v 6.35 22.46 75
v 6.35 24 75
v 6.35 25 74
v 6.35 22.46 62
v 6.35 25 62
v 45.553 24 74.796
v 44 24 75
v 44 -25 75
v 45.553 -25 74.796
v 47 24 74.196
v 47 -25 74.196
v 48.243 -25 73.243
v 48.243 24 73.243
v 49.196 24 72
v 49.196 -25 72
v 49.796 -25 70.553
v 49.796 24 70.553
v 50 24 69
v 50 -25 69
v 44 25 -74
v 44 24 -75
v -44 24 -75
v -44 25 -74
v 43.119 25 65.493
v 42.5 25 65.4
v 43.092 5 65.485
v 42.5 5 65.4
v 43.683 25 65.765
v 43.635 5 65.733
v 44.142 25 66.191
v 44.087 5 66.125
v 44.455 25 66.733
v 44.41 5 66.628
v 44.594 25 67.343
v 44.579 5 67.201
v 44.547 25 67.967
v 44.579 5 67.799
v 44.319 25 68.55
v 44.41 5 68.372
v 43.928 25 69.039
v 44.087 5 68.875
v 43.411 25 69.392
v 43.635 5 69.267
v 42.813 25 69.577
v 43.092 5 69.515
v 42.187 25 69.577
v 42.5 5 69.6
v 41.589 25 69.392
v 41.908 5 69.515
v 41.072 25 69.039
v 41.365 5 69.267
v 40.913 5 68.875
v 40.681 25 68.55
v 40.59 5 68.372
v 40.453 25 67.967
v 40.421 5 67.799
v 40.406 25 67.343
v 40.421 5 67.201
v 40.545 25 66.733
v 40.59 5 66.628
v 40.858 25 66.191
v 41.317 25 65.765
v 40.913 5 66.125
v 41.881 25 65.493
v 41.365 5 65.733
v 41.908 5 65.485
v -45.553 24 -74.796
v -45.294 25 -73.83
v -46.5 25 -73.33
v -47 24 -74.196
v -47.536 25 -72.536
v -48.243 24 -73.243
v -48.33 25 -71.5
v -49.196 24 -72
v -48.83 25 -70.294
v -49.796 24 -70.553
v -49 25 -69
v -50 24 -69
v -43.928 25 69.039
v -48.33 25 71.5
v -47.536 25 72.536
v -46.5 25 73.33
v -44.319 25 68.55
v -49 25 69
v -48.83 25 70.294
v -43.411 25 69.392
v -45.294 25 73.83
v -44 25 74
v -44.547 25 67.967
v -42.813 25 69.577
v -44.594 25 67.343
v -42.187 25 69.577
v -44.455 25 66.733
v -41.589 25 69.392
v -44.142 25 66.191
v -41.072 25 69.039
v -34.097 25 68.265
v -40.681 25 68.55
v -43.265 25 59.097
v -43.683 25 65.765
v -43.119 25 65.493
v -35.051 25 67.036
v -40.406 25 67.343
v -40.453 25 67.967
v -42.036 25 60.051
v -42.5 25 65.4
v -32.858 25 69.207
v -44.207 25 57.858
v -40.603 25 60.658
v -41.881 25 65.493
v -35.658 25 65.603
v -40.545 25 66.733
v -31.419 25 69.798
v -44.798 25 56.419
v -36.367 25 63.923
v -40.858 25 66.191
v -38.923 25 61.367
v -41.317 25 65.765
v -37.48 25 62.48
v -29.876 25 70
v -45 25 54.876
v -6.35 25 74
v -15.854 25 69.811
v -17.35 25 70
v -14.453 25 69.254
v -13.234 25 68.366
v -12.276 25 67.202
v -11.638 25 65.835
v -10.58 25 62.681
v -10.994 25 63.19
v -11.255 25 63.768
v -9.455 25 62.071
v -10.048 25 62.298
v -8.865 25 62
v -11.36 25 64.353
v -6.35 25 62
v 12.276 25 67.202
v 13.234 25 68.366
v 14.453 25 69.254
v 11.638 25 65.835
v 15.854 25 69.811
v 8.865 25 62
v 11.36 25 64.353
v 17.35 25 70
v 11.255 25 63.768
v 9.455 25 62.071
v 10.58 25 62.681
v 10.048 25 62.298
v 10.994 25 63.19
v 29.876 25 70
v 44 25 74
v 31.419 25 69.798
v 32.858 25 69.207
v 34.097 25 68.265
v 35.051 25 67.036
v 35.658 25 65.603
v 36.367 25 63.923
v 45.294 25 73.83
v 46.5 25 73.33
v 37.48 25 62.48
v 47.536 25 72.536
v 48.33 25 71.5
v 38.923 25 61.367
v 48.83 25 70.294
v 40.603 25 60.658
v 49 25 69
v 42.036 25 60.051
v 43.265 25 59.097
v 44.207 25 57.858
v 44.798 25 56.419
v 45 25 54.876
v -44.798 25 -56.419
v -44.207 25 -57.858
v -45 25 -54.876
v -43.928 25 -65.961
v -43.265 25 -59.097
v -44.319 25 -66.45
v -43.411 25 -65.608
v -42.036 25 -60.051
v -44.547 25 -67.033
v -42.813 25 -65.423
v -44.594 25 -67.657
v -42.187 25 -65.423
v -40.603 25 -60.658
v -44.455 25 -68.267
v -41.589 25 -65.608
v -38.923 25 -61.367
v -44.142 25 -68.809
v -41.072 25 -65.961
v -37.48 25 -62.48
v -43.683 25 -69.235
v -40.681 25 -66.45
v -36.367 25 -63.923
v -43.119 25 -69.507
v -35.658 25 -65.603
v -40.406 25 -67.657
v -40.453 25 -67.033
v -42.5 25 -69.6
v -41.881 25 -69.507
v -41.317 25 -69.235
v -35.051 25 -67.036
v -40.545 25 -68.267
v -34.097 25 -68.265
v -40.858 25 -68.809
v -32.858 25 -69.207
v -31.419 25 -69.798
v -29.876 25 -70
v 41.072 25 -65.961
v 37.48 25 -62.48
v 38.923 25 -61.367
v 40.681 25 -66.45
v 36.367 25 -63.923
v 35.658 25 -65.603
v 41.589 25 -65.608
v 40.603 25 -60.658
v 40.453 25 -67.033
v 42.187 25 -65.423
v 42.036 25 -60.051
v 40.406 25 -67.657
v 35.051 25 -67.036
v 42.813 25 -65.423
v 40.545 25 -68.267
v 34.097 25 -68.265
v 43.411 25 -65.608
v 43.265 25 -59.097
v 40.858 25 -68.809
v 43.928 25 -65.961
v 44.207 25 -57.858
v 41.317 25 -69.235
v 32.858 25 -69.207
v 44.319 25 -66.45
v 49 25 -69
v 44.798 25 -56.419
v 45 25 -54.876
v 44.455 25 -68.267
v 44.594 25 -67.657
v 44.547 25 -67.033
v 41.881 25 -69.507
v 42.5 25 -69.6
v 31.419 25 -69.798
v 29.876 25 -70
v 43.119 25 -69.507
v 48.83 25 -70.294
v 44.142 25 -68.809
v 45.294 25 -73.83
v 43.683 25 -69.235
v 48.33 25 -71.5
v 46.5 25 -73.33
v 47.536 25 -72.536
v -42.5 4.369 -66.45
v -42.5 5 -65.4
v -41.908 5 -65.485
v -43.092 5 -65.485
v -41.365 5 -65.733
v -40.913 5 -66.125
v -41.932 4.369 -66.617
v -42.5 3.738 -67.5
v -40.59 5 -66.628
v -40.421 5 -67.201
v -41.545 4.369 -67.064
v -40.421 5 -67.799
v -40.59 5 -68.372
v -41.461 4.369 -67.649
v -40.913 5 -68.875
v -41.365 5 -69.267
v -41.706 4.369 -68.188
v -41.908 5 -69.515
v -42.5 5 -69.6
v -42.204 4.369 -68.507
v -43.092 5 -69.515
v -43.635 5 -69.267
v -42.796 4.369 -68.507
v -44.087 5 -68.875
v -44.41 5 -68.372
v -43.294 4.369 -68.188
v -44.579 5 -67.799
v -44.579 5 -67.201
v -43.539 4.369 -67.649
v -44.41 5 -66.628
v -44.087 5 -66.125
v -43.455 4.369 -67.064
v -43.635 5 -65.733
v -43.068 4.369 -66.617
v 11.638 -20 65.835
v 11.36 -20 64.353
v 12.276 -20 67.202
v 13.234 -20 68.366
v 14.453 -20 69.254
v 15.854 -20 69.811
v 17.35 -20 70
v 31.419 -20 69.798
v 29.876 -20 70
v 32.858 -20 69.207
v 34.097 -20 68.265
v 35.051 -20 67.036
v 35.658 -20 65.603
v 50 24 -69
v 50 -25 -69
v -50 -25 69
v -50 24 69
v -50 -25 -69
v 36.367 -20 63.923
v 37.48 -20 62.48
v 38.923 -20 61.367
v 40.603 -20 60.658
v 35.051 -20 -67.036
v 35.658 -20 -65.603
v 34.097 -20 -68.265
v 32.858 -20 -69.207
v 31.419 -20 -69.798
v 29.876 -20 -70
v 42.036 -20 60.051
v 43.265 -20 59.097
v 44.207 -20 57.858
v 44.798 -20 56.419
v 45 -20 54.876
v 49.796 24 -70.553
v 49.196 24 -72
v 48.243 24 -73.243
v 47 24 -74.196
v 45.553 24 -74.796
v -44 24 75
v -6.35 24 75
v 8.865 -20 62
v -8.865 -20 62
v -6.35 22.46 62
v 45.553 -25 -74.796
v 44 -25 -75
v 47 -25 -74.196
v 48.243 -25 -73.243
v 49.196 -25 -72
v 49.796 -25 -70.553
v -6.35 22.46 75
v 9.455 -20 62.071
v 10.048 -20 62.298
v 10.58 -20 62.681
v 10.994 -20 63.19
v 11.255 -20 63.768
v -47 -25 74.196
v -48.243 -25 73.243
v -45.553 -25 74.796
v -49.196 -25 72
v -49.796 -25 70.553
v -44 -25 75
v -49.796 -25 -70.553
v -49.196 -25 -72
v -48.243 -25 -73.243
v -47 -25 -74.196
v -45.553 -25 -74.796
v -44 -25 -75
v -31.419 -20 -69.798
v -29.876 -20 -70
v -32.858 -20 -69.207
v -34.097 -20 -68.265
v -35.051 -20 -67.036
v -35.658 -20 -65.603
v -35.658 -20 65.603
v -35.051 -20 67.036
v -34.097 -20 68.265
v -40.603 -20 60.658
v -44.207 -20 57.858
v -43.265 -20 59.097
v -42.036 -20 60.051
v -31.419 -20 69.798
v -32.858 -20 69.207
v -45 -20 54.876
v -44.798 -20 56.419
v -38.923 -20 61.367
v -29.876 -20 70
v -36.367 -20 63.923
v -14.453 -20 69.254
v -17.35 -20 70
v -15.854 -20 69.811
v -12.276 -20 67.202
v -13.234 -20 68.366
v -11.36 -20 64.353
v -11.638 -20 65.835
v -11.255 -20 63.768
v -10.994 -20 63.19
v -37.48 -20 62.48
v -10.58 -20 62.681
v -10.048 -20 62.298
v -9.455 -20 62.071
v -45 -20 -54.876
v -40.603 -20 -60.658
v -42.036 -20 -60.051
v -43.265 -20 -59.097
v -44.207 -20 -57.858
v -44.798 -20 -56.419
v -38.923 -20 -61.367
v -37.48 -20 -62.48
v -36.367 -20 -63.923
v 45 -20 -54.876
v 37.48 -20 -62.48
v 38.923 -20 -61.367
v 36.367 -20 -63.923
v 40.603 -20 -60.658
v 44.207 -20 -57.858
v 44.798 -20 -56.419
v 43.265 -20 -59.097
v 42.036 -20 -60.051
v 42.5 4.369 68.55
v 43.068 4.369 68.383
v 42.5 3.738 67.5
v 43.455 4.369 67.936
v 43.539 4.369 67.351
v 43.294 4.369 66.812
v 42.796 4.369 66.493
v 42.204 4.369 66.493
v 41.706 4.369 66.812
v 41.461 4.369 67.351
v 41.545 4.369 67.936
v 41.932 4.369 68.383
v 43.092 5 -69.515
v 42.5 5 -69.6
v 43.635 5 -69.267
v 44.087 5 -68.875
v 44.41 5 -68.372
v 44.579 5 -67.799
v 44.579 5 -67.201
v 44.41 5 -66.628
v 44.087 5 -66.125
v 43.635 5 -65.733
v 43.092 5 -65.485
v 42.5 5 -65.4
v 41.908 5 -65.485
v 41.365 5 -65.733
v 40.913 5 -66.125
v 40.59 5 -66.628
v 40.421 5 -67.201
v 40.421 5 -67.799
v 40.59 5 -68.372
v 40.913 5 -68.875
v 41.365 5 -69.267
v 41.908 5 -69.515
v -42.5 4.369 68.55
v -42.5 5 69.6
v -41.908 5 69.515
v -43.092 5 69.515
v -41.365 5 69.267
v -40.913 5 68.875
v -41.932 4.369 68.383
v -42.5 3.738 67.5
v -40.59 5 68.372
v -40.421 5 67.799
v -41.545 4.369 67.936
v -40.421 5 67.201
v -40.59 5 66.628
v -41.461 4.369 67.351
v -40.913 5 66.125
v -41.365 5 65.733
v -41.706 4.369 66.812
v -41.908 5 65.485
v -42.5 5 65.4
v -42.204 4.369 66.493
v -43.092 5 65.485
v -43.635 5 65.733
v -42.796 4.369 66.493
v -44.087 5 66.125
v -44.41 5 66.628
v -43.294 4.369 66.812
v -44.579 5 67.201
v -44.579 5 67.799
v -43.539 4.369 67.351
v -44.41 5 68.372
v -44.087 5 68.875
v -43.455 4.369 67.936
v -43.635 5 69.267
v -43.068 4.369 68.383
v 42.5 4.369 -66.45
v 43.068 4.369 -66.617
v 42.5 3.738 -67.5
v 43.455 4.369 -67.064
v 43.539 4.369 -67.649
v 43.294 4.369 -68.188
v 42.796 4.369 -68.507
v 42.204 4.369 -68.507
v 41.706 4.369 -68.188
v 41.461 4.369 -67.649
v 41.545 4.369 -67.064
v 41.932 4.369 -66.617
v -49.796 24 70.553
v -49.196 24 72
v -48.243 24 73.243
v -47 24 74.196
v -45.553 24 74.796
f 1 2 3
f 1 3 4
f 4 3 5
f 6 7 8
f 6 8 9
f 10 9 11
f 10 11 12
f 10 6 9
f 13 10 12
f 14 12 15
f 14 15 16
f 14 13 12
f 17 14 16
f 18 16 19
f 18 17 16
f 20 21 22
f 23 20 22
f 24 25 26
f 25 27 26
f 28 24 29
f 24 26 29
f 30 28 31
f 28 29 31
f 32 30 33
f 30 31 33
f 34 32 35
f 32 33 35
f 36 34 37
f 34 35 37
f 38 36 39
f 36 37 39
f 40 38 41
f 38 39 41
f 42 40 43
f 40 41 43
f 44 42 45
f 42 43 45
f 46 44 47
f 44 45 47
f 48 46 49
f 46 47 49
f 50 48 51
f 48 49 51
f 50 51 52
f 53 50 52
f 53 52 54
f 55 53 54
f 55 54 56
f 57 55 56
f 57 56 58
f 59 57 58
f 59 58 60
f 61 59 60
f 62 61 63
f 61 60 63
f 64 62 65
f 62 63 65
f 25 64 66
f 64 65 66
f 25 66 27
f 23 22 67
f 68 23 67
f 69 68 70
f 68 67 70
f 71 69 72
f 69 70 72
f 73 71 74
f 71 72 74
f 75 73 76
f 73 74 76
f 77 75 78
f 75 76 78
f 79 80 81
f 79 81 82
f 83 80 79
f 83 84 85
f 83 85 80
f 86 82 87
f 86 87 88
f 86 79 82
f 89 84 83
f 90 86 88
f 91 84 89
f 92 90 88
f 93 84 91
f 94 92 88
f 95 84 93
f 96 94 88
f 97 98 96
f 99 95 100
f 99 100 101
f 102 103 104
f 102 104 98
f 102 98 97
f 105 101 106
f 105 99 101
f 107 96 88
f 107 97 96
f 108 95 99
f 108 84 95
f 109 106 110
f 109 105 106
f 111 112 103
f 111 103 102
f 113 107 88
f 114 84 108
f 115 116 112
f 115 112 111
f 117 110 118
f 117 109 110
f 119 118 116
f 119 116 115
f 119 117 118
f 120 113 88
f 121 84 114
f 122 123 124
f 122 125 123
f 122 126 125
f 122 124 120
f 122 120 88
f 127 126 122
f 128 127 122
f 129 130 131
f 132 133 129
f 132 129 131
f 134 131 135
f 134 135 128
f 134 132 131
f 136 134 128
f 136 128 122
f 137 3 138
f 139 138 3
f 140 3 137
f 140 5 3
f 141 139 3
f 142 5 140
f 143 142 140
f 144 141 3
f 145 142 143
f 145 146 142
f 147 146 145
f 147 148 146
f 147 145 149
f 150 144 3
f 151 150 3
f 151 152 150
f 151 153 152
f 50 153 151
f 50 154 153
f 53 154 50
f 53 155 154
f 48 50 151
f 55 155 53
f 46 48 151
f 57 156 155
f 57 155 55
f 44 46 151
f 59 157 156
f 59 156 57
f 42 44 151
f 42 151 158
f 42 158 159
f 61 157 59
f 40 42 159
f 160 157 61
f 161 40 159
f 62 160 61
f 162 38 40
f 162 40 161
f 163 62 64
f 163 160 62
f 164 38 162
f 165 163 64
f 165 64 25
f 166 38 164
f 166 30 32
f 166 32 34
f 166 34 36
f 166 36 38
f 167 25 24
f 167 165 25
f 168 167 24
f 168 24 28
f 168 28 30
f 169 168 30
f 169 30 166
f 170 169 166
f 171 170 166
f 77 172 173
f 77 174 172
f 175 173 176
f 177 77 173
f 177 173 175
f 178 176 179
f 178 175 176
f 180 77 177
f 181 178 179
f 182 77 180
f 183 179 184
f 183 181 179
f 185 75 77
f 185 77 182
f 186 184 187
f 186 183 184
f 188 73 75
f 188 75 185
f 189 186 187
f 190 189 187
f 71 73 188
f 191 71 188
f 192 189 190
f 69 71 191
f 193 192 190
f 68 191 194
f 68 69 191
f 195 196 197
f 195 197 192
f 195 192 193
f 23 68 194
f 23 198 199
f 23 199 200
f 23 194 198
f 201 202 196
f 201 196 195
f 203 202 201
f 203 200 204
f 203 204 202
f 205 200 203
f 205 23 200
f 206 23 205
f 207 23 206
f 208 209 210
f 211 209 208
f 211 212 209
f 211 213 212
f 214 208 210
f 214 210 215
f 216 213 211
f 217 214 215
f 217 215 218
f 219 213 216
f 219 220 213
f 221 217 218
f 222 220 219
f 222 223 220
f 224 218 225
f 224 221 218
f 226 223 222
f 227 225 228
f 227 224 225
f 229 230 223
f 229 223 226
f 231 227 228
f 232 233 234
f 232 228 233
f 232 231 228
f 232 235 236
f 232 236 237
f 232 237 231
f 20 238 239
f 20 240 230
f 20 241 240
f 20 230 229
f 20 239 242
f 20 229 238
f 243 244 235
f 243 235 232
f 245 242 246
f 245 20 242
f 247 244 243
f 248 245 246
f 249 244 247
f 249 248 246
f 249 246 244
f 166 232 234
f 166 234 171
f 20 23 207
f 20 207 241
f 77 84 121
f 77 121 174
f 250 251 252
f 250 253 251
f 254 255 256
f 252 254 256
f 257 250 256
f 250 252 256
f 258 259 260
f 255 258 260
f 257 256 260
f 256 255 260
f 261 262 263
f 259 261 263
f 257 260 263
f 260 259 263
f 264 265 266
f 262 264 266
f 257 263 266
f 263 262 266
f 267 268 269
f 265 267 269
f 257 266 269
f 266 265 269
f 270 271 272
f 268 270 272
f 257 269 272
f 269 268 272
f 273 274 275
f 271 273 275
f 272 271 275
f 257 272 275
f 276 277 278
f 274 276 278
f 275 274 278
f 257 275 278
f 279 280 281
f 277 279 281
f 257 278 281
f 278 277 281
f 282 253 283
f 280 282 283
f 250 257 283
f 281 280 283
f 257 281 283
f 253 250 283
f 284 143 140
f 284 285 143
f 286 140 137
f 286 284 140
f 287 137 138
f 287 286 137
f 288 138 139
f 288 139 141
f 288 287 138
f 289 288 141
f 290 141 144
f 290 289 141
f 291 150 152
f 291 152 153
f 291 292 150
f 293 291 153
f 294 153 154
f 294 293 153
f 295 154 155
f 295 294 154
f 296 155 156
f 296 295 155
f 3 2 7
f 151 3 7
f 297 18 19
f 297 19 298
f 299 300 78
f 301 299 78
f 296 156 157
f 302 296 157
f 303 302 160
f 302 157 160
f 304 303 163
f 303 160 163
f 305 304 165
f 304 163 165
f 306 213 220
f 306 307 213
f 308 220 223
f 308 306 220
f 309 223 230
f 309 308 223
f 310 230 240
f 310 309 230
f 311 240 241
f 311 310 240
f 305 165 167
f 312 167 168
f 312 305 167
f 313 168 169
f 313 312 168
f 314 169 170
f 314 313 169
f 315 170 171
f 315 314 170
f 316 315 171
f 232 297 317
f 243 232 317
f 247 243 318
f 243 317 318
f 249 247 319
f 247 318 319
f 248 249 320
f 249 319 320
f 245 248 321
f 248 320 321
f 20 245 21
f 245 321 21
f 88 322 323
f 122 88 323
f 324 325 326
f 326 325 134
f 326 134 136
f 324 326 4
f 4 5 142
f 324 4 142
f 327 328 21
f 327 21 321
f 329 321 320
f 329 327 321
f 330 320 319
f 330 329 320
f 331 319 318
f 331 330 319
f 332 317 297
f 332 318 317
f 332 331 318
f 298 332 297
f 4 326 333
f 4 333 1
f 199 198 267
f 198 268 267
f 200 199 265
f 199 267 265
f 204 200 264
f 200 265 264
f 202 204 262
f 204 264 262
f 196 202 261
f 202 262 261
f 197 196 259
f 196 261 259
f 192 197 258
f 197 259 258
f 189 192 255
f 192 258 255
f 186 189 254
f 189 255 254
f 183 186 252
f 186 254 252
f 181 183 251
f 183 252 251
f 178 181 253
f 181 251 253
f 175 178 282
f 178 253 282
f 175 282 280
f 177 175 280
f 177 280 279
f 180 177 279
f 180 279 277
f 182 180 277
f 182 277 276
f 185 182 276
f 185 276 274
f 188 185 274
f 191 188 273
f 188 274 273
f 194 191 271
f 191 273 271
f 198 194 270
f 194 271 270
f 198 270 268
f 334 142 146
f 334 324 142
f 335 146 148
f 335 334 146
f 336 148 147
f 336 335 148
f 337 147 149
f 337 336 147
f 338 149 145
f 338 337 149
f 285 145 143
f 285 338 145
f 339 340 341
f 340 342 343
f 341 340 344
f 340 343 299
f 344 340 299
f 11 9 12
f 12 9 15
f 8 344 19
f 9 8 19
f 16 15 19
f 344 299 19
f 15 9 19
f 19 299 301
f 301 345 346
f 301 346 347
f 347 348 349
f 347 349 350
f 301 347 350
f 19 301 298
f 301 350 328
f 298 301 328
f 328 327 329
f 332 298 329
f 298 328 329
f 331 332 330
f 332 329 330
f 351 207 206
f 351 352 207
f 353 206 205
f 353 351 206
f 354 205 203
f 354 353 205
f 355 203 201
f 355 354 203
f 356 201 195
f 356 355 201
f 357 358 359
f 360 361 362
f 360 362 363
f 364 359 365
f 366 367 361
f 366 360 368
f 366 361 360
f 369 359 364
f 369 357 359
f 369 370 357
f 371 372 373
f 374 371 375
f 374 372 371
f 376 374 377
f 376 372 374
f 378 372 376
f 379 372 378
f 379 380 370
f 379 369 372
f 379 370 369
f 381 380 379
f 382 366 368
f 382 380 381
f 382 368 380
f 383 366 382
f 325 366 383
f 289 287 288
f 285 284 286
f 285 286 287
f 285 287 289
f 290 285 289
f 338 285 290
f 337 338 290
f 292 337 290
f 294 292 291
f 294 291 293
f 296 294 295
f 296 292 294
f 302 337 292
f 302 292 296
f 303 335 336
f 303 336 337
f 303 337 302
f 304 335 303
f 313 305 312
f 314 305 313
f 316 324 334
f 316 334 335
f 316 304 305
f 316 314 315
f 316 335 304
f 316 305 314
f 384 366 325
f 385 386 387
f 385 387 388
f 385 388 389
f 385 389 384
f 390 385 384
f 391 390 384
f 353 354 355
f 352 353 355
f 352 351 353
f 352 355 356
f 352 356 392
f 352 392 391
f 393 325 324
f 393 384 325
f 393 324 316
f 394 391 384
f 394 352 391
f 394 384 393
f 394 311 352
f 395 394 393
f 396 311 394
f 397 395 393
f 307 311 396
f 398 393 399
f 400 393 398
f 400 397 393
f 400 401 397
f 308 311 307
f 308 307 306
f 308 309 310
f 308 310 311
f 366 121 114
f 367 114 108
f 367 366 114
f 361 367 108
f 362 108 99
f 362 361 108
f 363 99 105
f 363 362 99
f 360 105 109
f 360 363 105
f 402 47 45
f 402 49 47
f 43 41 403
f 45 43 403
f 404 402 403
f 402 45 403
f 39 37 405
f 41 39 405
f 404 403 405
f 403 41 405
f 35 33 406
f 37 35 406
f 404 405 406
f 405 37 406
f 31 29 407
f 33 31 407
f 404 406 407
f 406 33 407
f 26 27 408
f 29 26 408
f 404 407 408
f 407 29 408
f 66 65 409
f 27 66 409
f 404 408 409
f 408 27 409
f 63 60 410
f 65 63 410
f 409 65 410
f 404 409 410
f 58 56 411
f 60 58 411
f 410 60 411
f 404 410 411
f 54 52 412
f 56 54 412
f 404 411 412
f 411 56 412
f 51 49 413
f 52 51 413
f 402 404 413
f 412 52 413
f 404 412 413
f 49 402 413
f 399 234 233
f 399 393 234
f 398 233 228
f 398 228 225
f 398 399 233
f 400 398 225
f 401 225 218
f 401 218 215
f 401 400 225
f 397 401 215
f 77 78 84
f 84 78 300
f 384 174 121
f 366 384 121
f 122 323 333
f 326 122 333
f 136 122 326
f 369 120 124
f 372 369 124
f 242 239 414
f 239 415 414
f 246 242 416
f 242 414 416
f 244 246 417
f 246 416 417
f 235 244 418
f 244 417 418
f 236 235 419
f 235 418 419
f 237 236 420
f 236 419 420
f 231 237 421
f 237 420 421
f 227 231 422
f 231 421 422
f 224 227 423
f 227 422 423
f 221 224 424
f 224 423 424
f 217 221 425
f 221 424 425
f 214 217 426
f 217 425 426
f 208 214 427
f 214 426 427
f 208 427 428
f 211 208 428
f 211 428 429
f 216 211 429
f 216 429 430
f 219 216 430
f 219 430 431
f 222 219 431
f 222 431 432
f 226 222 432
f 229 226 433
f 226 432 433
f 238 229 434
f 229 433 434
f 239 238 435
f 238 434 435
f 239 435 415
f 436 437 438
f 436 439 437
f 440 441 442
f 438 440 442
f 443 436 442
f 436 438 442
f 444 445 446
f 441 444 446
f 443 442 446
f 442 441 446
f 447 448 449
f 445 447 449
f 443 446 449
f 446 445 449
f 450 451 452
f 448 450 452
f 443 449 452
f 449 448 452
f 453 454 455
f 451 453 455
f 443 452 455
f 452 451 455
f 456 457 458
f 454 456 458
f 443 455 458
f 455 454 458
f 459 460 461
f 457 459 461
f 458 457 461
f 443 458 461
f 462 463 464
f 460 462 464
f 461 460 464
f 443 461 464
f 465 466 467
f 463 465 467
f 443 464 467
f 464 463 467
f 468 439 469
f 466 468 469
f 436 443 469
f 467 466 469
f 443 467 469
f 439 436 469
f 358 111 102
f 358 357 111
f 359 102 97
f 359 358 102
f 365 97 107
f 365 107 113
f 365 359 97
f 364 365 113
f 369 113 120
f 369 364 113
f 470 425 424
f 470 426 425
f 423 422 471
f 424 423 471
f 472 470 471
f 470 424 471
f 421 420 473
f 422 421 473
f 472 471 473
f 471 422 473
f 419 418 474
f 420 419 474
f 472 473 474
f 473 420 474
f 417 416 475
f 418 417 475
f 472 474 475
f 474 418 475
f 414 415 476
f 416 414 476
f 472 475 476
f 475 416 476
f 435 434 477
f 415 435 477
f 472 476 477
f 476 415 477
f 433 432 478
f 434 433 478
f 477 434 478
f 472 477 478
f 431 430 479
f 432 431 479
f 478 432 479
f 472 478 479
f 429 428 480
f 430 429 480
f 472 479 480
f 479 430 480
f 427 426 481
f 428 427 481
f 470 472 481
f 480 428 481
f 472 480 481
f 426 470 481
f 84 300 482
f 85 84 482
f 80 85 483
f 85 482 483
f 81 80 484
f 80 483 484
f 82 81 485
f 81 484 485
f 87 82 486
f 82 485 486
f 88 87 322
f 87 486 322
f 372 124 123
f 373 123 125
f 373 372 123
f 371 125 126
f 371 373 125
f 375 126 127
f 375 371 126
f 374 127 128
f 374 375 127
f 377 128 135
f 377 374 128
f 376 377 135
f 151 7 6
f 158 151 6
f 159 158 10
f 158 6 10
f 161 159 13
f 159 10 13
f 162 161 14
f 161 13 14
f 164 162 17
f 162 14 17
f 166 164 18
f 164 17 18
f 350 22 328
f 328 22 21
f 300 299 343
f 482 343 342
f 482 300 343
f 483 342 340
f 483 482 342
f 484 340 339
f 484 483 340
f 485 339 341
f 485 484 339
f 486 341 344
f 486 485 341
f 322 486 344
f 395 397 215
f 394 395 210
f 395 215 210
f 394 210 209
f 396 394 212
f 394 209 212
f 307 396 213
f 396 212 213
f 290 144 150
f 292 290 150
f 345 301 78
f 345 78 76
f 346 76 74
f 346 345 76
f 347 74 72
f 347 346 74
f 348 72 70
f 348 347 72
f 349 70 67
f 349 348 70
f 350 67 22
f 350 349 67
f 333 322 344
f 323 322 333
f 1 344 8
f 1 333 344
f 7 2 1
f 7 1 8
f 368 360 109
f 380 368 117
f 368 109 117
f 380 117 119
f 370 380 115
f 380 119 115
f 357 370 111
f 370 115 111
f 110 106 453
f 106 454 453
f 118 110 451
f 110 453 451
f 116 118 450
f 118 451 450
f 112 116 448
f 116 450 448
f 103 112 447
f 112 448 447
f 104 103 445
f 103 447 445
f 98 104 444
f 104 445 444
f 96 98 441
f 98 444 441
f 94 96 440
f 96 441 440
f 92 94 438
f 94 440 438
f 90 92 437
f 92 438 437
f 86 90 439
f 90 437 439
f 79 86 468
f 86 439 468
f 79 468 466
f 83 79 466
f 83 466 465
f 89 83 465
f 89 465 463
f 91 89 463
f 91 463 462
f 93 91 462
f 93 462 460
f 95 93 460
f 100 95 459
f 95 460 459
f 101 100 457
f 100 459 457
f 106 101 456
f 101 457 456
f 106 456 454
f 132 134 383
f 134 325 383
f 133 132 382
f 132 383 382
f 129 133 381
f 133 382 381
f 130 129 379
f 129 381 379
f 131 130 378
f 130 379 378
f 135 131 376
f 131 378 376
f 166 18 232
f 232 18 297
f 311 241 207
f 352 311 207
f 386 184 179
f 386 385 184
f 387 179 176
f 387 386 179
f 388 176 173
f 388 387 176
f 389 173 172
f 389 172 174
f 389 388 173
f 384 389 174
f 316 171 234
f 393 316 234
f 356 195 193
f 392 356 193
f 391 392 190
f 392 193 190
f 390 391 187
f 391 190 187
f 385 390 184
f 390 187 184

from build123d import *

# Parameters (mm, degrees)
SKETCH1_W                       = 100
SKETCH1_H                       = 150
BOSS_EXTRUDE1_DEPTH             = 25
TAP_DRILL_FOR_M5X0_8_TAP1_D     = 4.2
TAP_DRILL_FOR_M5X0_8_TAP1_DEPTH = 20
TAP_DRILL_FOR_M5X0_8_TAP1_TIP   = 1.2618073
CUT_EXTRUDE1_DEPTH              = 45
SKETCH6_W                       = 12.7
SKETCH6_H                       = 13
CUT_EXTRUDE2_DEPTH              = 2.54
FILLET1_R                       = 6
FILLET3_R                       = 2.5
CHAMFER1_SIZE                   = 1


with BuildPart() as part:
    # Sketch1 → Boss-Extrude1 (new, symmetric)
    with BuildSketch(Plane(origin=(0, 0, 0), x_dir=(1, 0, 0), z_dir=(0, 1, 0))):
        Rectangle(SKETCH1_W, SKETCH1_H)
    extrude(amount=BOSS_EXTRUDE1_DEPTH, both=True)

    # Tap Drill for M5x0.8 Tap1
    with Locations(Plane(origin=(-42.5, 25, -67.5), x_dir=(0, 0, 1), z_dir=(0, 1, 0))):
        with Locations((0, 0), (0, 85), (135, 85), (135, 0)):
            Hole(TAP_DRILL_FOR_M5X0_8_TAP1_D / 2, depth=TAP_DRILL_FOR_M5X0_8_TAP1_DEPTH)
            with Locations((0, 0, -(TAP_DRILL_FOR_M5X0_8_TAP1_DEPTH + TAP_DRILL_FOR_M5X0_8_TAP1_TIP / 2))):  # 118° drill point
                Cone(0, TAP_DRILL_FOR_M5X0_8_TAP1_D / 2, TAP_DRILL_FOR_M5X0_8_TAP1_TIP, mode=Mode.SUBTRACT)

    # Sketch5 → Cut-Extrude1 (cut)
    with BuildSketch(Plane(origin=(0, 25, 0), x_dir=(1, 0, 0), z_dir=(0, 1, 0))):
        with BuildLine():
            Line((-45, 60.85470091), (-45, -60.85470091))
            ThreePointArc((-45, -60.85470091), (-37.479541854, -62.479541854), (-35.85470091, -70))
            Line((-35.85470091, -70), (-11.35, -70))
            Line((-11.35, -70), (-11.35, -62))
            Line((-11.35, -62), (11.35, -62))
            Line((11.35, -62), (11.35, -70))
            Line((11.35, -70), (35.85470091, -70))
            ThreePointArc((35.85470091, -70), (37.479541854, -62.479541854), (45, -60.85470091))
            Line((45, -60.85470091), (45, 60.85470091))
            ThreePointArc((45, 60.85470091), (37.479541854, 62.479541854), (35.85470091, 70))
            Line((35.85470091, 70), (-35.85470091, 70))
            ThreePointArc((-35.85470091, 70), (-37.479541854, 62.479541854), (-45, 60.85470091))
        make_face()
    extrude(amount=-CUT_EXTRUDE1_DEPTH, mode=Mode.SUBTRACT)

    # Sketch6 → Cut-Extrude2 (cut)
    with BuildSketch(Plane(origin=(0, 25, 0), x_dir=(1, 0, 0), z_dir=(0, 1, 0))):
        with Locations((0, -68.5)):
            Rectangle(SKETCH6_W, SKETCH6_H)
    extrude(amount=-CUT_EXTRUDE2_DEPTH, mode=Mode.SUBTRACT)

    # Fillet1
    fillet1_edges = [part.edges().sort_by_distance(p)[0] for p in [
        (-45, 2.5, 60.85470091),
        (-35.85470091, 2.5, 70),
        (-11.35, 2.5, 70),
        (11.35, 2.5, 70),
        (35.85470091, 2.5, 70),
        (45, 2.5, 60.85470091),
        (45, 2.5, -60.85470091),
        (35.85470091, 2.5, -70),
        (-35.85470091, 2.5, -70),
        (-45, 2.5, -60.85470091),
        (50, 0, 75),
        (-50, 0, 75),
        (-50, 0, -75),
        (50, 0, -75),
    ]]
    fillet(fillet1_edges, radius=FILLET1_R)

    # Fillet3
    fillet3_edges = [part.edges().sort_by_distance(p)[0] for p in [
        (11.35, 2.5, 62),
        (-11.35, 2.5, 62),
    ]]
    fillet(fillet3_edges, radius=FILLET3_R)

    # Chamfer1
    chamfer1_edges = [part.edges().sort_by_distance(p)[0] for p in [
        (25.175, 25, 75),
        (0, 25, -75),
        (50, 25, 0),
        (-50, 25, 0),
        (-25.175, 25, 75),
        (48.242640687, 25, 73.242640687),
        (-48.242640687, 25, 73.242640687),
        (-48.242640687, 25, -73.242640687),
        (48.242640687, 25, -73.242640687),
    ]]
    chamfer(chamfer1_edges, length=CHAMFER1_SIZE)


solid = part.part
